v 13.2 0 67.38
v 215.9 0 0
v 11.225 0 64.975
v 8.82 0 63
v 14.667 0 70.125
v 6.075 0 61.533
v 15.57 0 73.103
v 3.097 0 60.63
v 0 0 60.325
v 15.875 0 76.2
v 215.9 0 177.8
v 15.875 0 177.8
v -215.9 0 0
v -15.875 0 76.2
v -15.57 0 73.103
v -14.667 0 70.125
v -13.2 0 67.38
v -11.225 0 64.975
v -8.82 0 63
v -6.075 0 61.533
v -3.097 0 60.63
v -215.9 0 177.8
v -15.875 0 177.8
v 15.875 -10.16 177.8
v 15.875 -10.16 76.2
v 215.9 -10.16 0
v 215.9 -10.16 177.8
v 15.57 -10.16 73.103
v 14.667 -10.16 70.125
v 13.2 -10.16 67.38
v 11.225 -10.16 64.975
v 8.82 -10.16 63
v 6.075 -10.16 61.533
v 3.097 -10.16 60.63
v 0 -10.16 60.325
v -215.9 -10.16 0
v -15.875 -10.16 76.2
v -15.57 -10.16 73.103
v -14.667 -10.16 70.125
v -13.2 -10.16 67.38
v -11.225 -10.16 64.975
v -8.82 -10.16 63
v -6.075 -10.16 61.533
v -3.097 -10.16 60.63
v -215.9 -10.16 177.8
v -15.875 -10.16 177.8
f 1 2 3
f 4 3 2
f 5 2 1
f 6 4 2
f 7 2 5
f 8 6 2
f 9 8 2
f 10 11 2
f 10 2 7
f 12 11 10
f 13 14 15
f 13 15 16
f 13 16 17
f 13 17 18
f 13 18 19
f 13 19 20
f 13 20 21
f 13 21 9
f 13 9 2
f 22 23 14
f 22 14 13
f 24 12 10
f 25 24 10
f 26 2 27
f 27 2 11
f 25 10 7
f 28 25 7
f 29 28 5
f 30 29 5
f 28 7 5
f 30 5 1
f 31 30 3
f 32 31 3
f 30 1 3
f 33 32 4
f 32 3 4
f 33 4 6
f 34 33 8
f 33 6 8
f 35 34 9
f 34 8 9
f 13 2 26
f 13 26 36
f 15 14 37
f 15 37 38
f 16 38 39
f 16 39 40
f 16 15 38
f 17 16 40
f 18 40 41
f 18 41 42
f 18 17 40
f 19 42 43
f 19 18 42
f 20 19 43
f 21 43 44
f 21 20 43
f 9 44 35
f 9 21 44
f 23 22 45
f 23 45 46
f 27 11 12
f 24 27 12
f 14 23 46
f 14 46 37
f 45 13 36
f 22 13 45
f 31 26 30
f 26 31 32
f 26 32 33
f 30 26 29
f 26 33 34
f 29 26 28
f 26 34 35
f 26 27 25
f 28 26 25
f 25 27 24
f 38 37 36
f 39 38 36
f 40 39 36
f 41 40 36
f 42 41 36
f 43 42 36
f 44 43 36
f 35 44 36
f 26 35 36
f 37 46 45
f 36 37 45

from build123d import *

# Parameters (mm, degrees)
F1_DEPTH = 10.16


with BuildPart() as f1:
    # F0 (on Front) → F1 (new body)
    with BuildSketch(Plane.XZ):
        with BuildLine():
            Line((0, 60.325), (0, 0))
            Line((0, 0), (215.9, 0))
            Line((215.9, 0), (215.9, 177.8))
            Line((215.9, 177.8), (15.875, 177.8))
            Line((15.875, 177.8), (15.875, 76.2))
            ThreePointArc((15.875, 76.2), (11.22532, 64.97468), (0, 60.325))
        make_face()
    extrude(amount=F1_DEPTH)

    # F2: F1 across plane


with BuildPart() as f1_1:
    add(f1.part)
    add(f1.part.mirror(Plane.YZ))


solid = f1_1.part
